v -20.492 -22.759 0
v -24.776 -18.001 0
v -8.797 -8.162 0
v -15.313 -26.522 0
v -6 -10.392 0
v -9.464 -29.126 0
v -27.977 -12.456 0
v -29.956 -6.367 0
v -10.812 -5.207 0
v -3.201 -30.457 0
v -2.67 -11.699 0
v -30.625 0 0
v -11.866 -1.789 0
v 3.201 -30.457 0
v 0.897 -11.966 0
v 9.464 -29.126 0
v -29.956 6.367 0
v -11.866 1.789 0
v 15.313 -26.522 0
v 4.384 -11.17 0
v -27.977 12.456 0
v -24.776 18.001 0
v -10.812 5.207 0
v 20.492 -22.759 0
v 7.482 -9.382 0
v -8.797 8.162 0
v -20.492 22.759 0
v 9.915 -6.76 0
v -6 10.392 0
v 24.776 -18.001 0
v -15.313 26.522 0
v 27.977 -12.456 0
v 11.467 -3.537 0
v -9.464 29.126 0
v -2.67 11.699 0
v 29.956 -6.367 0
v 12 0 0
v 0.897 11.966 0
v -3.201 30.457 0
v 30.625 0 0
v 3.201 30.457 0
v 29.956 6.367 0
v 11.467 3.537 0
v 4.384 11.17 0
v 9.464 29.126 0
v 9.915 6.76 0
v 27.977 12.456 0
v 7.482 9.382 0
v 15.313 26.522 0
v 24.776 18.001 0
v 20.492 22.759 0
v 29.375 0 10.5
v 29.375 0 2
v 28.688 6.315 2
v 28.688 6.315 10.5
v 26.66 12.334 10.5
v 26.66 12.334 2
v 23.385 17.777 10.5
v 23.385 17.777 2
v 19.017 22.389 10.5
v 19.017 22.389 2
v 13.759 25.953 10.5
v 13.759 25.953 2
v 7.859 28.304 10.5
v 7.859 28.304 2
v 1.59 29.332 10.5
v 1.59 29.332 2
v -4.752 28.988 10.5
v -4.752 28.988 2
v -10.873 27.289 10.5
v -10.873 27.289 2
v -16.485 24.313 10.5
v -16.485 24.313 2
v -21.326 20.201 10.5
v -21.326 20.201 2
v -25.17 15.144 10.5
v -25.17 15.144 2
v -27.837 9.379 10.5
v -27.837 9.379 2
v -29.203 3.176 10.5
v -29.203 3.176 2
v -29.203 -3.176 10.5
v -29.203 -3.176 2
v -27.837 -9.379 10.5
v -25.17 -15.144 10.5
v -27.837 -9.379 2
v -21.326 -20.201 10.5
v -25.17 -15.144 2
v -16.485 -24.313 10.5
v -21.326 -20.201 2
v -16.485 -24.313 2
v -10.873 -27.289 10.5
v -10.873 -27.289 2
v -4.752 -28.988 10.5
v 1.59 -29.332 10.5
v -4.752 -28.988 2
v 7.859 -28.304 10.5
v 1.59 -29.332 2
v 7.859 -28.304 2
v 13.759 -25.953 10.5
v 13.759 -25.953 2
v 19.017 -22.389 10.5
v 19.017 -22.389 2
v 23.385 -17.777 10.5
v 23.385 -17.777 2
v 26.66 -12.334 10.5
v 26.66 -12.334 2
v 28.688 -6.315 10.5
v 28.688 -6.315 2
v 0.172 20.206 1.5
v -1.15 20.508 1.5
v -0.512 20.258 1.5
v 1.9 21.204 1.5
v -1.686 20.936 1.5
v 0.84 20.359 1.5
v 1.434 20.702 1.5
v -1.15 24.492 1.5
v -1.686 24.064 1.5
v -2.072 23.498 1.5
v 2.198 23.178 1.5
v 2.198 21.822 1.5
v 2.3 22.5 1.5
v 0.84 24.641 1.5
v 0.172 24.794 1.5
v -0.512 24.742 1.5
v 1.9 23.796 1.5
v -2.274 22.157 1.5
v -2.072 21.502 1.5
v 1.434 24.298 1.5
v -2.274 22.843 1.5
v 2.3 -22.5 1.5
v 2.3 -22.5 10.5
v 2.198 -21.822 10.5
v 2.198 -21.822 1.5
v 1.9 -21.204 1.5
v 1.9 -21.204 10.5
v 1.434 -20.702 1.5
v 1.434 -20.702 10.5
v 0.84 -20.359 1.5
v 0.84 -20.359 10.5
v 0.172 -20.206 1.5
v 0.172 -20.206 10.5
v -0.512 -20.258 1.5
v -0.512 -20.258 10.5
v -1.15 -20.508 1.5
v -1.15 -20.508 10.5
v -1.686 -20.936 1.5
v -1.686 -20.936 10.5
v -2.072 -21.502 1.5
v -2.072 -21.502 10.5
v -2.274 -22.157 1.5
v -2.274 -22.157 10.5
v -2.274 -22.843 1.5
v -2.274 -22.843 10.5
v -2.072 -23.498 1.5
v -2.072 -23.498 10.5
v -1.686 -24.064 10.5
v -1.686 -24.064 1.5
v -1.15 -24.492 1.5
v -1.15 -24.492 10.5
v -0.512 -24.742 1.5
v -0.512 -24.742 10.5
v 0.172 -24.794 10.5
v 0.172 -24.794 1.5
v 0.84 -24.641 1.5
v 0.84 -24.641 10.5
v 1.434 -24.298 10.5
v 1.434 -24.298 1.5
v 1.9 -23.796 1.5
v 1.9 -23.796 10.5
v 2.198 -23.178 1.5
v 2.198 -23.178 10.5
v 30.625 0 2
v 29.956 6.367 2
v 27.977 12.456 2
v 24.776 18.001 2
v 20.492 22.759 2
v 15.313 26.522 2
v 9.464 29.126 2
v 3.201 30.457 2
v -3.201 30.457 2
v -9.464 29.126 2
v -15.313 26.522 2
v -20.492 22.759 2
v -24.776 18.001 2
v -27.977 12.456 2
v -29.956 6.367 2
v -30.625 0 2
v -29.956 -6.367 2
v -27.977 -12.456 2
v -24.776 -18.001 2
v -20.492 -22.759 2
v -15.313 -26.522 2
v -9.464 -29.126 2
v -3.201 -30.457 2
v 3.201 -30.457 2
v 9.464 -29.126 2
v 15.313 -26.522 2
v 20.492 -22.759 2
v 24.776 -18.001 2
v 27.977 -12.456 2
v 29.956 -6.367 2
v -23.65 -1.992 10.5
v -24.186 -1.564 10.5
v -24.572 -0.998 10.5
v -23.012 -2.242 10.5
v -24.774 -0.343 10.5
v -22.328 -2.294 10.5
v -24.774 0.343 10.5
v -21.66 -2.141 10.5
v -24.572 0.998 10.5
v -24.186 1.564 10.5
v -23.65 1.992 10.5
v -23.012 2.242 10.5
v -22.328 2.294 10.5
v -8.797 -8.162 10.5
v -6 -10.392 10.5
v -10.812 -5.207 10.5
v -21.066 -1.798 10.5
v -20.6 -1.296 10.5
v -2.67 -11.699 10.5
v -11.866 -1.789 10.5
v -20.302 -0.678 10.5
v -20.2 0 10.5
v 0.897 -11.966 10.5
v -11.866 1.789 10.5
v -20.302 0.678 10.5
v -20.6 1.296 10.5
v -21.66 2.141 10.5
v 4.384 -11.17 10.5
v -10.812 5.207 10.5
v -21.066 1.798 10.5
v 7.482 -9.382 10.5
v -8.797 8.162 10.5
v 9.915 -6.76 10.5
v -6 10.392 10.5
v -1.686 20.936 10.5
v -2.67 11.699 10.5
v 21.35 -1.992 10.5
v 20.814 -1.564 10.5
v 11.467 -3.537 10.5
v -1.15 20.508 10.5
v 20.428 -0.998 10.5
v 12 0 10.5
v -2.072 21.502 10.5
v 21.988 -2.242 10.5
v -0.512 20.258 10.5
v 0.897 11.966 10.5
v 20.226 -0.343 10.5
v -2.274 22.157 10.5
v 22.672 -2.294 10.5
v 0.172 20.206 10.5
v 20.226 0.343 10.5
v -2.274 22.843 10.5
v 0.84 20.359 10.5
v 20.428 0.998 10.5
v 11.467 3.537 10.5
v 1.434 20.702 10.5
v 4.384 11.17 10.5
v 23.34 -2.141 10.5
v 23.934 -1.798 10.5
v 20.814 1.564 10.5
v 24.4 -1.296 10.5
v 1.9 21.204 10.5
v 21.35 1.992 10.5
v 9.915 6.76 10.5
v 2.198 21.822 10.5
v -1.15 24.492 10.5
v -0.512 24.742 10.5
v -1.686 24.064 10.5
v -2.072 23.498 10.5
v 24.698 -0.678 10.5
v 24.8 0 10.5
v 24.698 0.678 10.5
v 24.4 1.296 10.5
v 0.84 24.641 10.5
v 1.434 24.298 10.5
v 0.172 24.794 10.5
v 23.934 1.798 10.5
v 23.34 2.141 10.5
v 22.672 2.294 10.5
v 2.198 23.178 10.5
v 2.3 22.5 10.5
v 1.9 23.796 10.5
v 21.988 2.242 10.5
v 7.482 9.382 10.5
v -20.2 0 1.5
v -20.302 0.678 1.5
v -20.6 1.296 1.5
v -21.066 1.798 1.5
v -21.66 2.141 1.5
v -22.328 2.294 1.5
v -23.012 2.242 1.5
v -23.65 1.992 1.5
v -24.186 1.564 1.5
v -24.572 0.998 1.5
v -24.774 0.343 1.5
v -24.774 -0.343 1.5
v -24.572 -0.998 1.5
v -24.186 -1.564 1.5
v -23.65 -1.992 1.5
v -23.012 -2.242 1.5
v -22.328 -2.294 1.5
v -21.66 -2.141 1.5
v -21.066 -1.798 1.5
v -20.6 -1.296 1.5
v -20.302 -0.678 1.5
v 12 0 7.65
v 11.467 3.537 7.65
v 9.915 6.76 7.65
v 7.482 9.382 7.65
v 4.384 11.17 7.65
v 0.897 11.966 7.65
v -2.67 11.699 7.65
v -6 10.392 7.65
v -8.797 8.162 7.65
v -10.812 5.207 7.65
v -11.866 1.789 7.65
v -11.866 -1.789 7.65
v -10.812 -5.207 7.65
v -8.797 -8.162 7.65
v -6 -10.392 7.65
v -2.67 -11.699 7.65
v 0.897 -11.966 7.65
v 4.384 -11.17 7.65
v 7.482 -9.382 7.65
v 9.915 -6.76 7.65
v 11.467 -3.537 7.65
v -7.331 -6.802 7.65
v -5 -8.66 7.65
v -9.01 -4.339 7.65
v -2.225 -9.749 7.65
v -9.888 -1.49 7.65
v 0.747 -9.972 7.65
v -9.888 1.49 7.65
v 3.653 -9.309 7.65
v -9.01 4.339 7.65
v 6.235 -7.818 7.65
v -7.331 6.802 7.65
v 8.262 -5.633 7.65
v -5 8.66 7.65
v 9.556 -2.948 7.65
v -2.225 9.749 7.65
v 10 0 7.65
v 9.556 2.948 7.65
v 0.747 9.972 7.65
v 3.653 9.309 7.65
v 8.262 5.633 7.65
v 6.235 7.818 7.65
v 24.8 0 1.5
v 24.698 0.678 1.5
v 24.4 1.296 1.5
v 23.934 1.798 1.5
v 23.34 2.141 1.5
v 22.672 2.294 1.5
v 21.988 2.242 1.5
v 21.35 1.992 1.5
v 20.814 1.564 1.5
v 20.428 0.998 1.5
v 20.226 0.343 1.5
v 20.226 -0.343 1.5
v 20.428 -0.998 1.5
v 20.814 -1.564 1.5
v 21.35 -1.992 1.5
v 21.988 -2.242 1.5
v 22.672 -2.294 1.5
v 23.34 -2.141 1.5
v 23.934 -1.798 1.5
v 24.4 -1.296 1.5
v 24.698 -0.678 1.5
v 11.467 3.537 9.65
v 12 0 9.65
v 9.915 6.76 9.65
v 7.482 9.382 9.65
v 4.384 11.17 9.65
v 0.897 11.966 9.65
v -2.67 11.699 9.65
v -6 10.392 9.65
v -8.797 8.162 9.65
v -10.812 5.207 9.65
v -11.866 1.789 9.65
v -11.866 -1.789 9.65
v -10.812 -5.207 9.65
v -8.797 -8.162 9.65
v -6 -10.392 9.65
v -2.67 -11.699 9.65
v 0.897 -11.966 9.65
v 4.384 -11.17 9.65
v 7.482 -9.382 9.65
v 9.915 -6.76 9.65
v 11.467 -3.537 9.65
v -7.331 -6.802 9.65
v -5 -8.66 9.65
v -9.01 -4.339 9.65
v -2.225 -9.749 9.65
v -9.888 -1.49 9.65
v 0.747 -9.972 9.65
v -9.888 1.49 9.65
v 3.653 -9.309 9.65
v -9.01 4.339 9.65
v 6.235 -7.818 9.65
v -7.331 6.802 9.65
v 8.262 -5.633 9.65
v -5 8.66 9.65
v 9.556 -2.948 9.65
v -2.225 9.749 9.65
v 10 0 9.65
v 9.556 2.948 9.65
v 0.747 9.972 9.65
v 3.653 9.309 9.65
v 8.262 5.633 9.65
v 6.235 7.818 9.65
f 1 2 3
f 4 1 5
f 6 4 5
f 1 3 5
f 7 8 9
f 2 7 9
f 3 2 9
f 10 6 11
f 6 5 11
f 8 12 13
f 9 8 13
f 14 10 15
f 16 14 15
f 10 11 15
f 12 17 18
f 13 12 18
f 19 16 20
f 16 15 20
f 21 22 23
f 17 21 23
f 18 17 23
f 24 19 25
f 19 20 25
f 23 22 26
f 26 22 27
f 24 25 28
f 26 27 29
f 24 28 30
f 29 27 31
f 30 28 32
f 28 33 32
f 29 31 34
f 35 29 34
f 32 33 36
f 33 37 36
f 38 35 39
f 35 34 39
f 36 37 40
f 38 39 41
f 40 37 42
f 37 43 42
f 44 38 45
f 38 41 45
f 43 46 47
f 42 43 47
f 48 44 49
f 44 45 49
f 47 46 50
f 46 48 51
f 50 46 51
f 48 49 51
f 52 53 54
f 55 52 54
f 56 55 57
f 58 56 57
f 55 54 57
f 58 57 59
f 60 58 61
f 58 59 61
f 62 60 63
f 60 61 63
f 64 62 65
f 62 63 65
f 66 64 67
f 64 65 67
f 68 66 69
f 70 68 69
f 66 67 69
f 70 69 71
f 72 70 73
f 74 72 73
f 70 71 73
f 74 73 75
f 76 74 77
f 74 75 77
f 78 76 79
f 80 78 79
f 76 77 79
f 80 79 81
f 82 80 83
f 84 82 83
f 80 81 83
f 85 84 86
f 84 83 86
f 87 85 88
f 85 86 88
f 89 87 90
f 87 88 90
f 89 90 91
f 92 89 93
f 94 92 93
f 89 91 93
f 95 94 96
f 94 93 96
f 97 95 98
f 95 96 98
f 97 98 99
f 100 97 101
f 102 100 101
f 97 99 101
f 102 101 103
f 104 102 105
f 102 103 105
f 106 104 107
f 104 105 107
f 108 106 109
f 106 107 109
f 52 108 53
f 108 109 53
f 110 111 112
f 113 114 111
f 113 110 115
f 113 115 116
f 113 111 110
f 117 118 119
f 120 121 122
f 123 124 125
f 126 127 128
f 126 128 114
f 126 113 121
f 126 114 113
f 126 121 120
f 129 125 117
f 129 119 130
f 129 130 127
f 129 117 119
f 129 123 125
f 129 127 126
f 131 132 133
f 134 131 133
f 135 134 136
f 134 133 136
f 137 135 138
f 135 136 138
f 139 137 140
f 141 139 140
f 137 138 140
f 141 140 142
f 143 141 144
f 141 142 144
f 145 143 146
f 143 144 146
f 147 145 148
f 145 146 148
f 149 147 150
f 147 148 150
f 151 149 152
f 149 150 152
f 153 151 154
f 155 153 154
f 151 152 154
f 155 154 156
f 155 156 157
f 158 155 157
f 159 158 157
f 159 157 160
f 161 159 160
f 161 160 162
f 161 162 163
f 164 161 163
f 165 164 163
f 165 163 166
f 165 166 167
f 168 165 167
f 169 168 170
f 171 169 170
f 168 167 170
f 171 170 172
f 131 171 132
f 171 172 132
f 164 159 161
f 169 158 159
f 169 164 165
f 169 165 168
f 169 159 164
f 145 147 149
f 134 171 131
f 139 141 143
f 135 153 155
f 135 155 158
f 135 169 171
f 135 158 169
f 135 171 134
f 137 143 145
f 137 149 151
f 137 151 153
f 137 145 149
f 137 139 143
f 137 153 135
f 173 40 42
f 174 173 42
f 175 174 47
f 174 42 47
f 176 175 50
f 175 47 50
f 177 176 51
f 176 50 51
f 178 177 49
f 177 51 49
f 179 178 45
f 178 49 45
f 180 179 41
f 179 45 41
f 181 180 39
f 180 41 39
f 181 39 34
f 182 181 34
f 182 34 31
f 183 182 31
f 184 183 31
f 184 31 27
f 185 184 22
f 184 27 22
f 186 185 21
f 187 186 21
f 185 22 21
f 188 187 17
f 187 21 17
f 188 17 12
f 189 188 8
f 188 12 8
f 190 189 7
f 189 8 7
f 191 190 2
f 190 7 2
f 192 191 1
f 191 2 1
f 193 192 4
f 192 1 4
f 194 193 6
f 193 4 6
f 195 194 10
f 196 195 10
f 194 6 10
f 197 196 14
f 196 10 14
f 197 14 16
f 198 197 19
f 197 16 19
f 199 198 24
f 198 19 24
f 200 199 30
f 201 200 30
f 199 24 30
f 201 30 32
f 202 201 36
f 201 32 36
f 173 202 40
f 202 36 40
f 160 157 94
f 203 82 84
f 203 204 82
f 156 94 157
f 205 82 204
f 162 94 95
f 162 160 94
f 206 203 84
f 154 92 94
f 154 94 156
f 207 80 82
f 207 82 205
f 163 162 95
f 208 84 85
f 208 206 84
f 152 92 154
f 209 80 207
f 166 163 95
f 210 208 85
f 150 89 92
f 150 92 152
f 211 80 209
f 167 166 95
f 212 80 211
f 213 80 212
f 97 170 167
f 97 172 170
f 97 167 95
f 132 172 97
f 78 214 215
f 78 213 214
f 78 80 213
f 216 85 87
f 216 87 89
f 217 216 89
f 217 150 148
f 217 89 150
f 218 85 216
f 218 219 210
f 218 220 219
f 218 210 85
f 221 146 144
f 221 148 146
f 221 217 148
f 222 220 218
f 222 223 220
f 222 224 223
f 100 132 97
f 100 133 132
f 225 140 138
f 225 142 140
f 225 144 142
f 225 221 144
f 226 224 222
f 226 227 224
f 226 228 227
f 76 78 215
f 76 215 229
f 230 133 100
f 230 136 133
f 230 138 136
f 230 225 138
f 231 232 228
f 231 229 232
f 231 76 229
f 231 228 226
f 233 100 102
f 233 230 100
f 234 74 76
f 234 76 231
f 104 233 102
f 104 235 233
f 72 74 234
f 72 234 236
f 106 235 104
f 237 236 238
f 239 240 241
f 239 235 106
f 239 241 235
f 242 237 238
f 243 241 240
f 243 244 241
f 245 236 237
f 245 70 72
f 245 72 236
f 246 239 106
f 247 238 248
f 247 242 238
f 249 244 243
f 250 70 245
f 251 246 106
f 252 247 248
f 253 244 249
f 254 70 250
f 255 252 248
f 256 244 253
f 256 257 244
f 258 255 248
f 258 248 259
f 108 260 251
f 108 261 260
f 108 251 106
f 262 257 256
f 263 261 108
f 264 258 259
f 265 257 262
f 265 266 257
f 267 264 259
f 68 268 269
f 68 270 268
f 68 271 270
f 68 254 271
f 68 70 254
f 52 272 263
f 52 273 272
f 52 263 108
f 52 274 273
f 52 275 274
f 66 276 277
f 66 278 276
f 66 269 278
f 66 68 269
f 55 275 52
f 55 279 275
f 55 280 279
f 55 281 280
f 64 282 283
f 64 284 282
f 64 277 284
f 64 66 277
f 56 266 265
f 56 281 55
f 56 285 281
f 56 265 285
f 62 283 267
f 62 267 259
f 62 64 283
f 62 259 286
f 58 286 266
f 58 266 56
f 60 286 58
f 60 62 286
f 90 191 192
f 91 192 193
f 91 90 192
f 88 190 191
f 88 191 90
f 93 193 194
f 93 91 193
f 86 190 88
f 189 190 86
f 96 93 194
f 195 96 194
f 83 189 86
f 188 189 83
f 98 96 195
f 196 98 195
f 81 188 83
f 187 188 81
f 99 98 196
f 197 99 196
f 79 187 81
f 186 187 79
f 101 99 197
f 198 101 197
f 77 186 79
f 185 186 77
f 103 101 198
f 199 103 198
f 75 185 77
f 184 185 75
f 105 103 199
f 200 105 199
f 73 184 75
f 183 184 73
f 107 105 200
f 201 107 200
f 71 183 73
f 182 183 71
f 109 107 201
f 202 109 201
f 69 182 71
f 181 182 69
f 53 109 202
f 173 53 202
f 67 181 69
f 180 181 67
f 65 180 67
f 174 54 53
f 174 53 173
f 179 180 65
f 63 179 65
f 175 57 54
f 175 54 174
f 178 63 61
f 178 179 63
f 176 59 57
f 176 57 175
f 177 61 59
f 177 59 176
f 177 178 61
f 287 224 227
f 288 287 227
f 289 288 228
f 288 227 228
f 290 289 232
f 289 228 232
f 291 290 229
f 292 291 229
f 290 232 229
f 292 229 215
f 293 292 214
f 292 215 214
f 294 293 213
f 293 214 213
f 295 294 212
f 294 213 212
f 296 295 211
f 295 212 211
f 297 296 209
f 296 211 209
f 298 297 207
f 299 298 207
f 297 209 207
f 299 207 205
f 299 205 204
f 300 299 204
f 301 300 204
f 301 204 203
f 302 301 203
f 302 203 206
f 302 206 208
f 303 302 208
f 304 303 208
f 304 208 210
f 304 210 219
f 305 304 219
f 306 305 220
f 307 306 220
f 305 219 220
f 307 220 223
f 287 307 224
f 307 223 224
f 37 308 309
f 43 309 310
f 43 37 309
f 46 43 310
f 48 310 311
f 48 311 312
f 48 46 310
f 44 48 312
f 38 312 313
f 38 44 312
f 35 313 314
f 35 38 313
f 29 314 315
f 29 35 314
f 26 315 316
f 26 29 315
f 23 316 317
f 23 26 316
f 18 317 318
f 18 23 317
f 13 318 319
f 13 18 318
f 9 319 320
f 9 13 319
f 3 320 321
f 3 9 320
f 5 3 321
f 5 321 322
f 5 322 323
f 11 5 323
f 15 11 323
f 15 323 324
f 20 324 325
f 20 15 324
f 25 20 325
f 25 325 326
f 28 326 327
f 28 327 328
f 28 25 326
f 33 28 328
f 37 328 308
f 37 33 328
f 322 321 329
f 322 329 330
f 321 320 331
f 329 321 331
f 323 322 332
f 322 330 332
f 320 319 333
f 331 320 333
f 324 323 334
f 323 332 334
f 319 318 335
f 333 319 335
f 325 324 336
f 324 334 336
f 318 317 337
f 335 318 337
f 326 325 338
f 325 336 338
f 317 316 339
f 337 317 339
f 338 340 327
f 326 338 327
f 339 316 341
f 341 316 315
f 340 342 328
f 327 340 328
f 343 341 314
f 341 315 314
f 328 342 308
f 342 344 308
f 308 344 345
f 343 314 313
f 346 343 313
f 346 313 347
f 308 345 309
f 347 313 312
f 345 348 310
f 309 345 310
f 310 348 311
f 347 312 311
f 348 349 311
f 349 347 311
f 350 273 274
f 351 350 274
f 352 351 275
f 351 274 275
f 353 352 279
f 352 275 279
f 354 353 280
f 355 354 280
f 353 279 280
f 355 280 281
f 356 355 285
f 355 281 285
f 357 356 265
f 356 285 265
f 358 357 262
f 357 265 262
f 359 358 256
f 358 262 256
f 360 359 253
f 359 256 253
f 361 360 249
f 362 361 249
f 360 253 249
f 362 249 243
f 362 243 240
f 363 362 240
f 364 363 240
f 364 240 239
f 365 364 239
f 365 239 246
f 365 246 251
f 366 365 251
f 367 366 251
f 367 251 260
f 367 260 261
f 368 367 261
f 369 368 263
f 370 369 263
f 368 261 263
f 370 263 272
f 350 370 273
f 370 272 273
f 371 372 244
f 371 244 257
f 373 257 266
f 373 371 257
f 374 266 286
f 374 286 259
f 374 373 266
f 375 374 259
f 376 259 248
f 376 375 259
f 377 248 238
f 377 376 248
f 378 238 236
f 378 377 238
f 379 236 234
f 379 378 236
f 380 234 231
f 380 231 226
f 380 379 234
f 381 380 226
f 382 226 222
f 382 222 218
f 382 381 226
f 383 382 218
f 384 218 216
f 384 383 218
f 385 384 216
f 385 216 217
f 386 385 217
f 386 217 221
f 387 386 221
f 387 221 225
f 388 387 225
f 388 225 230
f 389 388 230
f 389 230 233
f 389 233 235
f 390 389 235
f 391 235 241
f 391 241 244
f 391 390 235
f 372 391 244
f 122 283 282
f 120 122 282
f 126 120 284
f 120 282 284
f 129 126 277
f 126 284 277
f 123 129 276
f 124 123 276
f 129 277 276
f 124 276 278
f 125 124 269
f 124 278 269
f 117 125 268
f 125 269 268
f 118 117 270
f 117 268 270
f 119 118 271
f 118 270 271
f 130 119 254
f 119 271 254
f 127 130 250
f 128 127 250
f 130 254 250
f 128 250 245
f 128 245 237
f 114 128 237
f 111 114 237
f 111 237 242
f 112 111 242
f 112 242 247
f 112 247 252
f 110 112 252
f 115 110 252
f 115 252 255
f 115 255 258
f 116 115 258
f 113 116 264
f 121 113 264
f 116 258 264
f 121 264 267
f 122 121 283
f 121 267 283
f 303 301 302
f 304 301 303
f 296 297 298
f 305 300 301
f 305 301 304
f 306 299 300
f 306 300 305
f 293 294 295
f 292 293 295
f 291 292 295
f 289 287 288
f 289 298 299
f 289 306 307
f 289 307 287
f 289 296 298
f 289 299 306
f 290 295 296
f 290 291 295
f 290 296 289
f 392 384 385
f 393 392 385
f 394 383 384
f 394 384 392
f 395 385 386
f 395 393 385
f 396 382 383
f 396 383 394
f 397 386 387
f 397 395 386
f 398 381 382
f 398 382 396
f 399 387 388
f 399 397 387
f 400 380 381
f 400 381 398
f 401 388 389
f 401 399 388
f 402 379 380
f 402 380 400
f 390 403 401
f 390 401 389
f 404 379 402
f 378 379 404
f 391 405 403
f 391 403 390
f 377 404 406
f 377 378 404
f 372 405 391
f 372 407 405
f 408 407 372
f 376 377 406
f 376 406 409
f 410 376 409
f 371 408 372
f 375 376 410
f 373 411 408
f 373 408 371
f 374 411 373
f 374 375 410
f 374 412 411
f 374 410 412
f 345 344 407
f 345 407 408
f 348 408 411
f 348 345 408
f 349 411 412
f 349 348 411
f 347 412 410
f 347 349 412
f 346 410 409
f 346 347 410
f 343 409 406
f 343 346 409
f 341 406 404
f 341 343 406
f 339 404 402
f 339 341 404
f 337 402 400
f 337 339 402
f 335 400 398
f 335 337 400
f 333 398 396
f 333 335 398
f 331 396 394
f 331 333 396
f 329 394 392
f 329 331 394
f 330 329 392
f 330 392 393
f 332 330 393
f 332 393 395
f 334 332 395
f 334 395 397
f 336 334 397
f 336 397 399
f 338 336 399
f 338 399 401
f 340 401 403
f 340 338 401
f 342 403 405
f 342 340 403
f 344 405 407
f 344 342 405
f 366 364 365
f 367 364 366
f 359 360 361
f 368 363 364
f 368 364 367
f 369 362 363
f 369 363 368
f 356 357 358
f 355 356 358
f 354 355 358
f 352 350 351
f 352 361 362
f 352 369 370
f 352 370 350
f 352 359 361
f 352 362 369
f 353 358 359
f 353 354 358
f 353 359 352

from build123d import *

# Parameters (mm, degrees)
SKETCH1_R           = 30.625
SKETCH1_R_2         = 29.375
SKETCH1_R_3         = 12
BOSS_EXTRUDE1_DEPTH = 2
BOSS_EXTRUDE2_START = 2
SKETCH1_3_R         = 29.375
SKETCH1_3_R_2       = 12
BOSS_EXTRUDE2_DEPTH = 8.5
BOSS_EXTRUDE3_START = 7.65
SKETCH1_4_R         = 12
SKETCH1_4_R_2       = 10
BOSS_EXTRUDE3_DEPTH = 2
SKETCH2_R           = 2.3
CUT_EXTRUDE1_DEPTH  = 9


with BuildPart() as part:
    # Sketch1 → Boss-Extrude1 (new body)
    # profile 1 of 2: a face of its own
    with BuildSketch(Plane.XY):
        Circle(SKETCH1_R)
        Circle(SKETCH1_R_2, mode=Mode.SUBTRACT)
    # profile 2 of 2: a face of its own
    with BuildSketch(Plane.XY):
        Circle(SKETCH1_R_2)
        Circle(SKETCH1_R_3, mode=Mode.SUBTRACT)
    extrude(amount=BOSS_EXTRUDE1_DEPTH)

    # Sketch1<3> → Boss-Extrude2 (add)
    with BuildSketch(Plane.XY.offset(BOSS_EXTRUDE2_START)):
        Circle(SKETCH1_3_R)
        Circle(SKETCH1_3_R_2, mode=Mode.SUBTRACT)
    extrude(amount=BOSS_EXTRUDE2_DEPTH)

    # Sketch1<4> → Boss-Extrude3 (add)
    with BuildSketch(Plane.XY.offset(BOSS_EXTRUDE3_START)):
        Circle(SKETCH1_4_R)
        Circle(SKETCH1_4_R_2, mode=Mode.SUBTRACT)
    extrude(amount=BOSS_EXTRUDE3_DEPTH)

    # Sketch2 → Cut-Extrude1 (cut)
    with BuildSketch(Plane.XY.offset(10.5)):
        with Locations((0, 22.5)):
            Circle(SKETCH2_R)
        with Locations((22.5, 0)):
            Circle(SKETCH2_R)
        with Locations((0, -22.5)):
            Circle(SKETCH2_R)
        with Locations((-22.5, 0)):
            Circle(SKETCH2_R)
    extrude(amount=-CUT_EXTRUDE1_DEPTH, mode=Mode.SUBTRACT)


solid = part.part
